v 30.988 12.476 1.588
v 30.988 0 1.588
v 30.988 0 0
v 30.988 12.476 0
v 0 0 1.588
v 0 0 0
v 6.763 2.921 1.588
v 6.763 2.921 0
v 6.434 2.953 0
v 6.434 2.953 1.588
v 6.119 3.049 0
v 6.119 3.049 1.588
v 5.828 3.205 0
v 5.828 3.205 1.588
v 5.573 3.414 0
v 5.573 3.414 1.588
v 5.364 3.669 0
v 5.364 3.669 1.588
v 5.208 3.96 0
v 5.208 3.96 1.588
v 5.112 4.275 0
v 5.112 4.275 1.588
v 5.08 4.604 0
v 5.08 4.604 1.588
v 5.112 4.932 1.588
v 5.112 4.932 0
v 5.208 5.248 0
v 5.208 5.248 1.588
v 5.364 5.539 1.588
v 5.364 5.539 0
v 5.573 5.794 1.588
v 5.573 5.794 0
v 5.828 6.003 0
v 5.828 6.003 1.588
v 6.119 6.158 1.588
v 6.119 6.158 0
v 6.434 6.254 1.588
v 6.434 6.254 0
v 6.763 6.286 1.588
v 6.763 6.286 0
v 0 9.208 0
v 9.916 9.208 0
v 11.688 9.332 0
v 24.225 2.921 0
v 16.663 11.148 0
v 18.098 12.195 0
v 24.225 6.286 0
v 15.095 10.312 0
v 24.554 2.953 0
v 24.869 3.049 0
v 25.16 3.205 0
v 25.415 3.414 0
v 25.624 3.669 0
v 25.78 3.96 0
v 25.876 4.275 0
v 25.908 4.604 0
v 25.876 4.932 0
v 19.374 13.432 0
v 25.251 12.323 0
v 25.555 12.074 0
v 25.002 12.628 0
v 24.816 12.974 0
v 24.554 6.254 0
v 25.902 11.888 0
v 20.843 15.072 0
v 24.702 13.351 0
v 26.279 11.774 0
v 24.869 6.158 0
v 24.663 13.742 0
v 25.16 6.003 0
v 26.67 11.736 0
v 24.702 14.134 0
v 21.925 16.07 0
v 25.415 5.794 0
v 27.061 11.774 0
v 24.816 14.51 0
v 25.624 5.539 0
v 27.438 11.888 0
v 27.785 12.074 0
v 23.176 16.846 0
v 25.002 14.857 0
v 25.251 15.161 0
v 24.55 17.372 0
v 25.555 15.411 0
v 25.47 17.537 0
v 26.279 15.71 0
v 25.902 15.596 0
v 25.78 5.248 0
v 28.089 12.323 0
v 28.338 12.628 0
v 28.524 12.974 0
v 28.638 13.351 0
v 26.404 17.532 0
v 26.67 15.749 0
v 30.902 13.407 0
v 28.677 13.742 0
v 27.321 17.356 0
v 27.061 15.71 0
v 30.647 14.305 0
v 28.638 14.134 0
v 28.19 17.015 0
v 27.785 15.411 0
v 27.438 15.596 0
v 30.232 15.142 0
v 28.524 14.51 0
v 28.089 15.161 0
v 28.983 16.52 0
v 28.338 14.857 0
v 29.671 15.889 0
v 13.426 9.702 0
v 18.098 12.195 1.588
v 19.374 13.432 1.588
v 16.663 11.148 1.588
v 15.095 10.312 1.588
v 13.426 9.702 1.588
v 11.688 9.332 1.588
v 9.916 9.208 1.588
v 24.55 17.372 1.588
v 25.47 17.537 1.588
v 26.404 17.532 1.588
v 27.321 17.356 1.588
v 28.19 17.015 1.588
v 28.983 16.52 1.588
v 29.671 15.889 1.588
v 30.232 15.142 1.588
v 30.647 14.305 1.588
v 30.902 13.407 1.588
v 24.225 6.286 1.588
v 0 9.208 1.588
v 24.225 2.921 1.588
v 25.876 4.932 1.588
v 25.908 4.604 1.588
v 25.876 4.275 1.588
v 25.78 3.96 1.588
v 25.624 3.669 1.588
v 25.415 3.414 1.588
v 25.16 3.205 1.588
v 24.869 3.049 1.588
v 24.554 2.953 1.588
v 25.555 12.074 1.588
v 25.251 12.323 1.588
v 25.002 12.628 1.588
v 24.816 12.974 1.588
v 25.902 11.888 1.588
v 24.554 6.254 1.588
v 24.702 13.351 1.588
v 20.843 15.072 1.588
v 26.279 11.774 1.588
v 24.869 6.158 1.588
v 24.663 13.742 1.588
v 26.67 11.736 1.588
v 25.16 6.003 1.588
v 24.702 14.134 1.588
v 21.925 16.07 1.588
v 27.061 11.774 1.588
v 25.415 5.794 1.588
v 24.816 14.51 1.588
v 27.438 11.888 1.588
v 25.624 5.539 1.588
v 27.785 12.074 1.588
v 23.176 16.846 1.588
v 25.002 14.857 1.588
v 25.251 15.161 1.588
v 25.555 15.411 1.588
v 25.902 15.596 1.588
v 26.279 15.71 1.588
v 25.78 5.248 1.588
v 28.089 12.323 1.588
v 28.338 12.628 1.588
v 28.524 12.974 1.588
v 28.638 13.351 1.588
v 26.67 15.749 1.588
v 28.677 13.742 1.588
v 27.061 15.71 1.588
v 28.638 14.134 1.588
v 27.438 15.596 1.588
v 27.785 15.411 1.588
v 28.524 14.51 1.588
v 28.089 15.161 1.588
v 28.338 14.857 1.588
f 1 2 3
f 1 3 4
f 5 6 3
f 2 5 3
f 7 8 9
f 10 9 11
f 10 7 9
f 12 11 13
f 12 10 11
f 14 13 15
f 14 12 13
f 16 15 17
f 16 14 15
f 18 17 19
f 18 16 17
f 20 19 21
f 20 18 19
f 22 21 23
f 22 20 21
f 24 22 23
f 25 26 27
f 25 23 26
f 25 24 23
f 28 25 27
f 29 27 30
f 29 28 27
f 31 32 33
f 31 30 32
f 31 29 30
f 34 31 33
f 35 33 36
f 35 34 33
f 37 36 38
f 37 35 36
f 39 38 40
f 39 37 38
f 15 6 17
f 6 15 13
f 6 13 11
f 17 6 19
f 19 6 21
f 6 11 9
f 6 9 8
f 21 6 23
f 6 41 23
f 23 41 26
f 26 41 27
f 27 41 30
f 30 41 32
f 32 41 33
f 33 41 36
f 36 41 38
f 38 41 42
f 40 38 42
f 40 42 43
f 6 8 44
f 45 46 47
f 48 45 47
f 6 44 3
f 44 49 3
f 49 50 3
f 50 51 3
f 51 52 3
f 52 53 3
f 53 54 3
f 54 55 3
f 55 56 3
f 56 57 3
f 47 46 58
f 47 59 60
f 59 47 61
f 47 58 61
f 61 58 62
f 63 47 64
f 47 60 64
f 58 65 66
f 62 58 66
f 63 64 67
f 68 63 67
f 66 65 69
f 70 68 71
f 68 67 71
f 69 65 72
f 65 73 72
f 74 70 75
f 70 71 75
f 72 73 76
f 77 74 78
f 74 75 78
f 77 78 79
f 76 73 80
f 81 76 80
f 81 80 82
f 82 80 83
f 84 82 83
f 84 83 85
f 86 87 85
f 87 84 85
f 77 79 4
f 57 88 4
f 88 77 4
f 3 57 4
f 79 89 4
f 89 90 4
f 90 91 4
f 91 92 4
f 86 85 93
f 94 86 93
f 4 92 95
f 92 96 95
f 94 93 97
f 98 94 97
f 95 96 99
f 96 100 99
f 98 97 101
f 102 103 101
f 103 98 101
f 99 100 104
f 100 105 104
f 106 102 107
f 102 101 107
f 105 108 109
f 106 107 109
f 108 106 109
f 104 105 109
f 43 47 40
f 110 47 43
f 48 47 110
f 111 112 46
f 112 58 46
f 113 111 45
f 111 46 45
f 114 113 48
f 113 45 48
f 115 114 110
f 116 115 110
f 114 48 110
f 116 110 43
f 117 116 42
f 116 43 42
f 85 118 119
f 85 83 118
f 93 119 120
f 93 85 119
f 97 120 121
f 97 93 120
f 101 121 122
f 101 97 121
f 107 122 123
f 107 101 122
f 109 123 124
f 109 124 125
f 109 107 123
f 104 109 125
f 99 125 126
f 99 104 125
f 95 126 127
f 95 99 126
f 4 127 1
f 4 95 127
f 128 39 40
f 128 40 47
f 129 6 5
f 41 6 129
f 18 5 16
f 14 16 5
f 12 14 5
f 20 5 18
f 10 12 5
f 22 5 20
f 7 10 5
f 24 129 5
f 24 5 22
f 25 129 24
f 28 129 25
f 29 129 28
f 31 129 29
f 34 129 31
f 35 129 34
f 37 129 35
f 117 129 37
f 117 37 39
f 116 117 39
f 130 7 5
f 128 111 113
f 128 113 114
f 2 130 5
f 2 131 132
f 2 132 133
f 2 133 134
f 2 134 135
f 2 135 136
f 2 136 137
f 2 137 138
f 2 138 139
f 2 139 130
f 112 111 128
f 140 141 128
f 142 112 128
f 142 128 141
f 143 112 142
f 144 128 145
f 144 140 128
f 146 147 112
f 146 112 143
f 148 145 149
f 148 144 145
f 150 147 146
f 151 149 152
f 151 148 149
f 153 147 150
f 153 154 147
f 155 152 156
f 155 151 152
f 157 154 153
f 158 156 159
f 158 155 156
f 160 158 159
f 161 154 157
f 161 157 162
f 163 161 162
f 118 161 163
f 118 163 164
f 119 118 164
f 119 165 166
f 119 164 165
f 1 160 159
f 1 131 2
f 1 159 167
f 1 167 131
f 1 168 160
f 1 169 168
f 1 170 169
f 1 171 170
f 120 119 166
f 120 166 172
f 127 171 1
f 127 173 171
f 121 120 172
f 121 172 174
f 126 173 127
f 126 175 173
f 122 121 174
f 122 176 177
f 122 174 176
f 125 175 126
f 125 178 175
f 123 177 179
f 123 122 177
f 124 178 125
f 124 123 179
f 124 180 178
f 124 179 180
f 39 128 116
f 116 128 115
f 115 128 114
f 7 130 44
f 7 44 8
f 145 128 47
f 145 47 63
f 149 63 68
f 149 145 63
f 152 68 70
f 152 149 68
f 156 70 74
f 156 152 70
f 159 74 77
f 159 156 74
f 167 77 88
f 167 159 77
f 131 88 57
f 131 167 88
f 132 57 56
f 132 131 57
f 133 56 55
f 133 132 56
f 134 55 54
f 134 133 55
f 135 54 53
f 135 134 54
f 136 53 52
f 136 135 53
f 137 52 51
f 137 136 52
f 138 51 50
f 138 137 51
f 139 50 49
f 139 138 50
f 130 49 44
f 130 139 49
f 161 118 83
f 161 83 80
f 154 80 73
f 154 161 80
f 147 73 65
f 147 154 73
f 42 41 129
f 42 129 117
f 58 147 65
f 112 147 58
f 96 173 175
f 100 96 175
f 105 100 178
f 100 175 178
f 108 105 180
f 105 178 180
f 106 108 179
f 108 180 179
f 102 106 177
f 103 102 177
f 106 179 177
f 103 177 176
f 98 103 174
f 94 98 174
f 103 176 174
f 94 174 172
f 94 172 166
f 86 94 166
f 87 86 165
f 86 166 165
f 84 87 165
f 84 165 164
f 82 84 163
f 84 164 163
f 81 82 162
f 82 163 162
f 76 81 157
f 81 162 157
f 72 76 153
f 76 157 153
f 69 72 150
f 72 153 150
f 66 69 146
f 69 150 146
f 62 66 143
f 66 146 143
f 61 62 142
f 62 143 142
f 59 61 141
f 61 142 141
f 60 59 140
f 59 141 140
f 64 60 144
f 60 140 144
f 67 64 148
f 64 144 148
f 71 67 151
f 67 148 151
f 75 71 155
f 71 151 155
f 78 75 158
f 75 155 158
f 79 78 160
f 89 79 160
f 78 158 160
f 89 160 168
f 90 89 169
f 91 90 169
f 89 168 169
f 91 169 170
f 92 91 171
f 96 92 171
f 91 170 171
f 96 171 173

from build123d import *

# Parameters (mm, degrees)
SKETCH1_W           = 30.988
SKETCH1_H           = 9.2075
BOSS_EXTRUDE1_DEPTH = 1.5875
SKETCH2_R           = 2.0066
BOSS_EXTRUDE2_DEPTH = 1.5875
FILLET1_R           = 12.7
FILLET2_R           = 5.08
CUT_EXTRUDE1_DEPTH  = 36.65115735


with BuildPart() as part:
    # Sketch1 → Boss-Extrude1 (new body)
    with BuildSketch(Plane.XY):
        with Locations((15.494, 4.60375)):
            Rectangle(SKETCH1_W, SKETCH1_H)
    extrude(amount=BOSS_EXTRUDE1_DEPTH)

    # Sketch2 → Boss-Extrude2 (add)
    with BuildSketch(Plane.XY.offset(1.5875)):
        with BuildLine():
            Line((15.588120411, 9.2075), (30.988, 9.2075))
            Line((30.988, 9.2075), (30.988, 16.312421236))
            ThreePointArc((30.988, 16.312421236), (25.682747304, 17.596645629), (20.843386501, 15.071665335))
            Line((20.843386501, 15.071665335), (15.588120411, 9.2075))
        make_face()
        with Locations((26.67, 13.742344032)):
            Circle(SKETCH2_R, mode=Mode.SUBTRACT)
    extrude(amount=-BOSS_EXTRUDE2_DEPTH)

    # Fillet1
    fillet1_edges = [part.edges().sort_by_distance(p)[0] for p in [
        (15.588120411, 9.2075, 0.79375),
    ]]
    fillet(fillet1_edges, radius=FILLET1_R)

    # Fillet2
    fillet2_edges = [part.edges().sort_by_distance(p)[0] for p in [
        (30.988, 16.312421236, 0.79375),
    ]]
    fillet(fillet2_edges, radius=FILLET2_R)

    # Sketch3 → Cut-Extrude1 (cut, through all)
    with BuildSketch(Plane.XY.offset(1.5875)):
        with BuildLine():
            Line((6.76275, 6.2865), (24.22525, 6.2865))
            ThreePointArc((24.22525, 6.2865), (25.908, 4.60375), (24.22525, 2.921))
            Line((24.22525, 2.921), (6.76275, 2.921))
            ThreePointArc((6.76275, 2.921), (5.08, 4.60375), (6.76275, 6.2865))
        make_face()
    extrude(amount=-CUT_EXTRUDE1_DEPTH, mode=Mode.SUBTRACT)


solid = part.part
